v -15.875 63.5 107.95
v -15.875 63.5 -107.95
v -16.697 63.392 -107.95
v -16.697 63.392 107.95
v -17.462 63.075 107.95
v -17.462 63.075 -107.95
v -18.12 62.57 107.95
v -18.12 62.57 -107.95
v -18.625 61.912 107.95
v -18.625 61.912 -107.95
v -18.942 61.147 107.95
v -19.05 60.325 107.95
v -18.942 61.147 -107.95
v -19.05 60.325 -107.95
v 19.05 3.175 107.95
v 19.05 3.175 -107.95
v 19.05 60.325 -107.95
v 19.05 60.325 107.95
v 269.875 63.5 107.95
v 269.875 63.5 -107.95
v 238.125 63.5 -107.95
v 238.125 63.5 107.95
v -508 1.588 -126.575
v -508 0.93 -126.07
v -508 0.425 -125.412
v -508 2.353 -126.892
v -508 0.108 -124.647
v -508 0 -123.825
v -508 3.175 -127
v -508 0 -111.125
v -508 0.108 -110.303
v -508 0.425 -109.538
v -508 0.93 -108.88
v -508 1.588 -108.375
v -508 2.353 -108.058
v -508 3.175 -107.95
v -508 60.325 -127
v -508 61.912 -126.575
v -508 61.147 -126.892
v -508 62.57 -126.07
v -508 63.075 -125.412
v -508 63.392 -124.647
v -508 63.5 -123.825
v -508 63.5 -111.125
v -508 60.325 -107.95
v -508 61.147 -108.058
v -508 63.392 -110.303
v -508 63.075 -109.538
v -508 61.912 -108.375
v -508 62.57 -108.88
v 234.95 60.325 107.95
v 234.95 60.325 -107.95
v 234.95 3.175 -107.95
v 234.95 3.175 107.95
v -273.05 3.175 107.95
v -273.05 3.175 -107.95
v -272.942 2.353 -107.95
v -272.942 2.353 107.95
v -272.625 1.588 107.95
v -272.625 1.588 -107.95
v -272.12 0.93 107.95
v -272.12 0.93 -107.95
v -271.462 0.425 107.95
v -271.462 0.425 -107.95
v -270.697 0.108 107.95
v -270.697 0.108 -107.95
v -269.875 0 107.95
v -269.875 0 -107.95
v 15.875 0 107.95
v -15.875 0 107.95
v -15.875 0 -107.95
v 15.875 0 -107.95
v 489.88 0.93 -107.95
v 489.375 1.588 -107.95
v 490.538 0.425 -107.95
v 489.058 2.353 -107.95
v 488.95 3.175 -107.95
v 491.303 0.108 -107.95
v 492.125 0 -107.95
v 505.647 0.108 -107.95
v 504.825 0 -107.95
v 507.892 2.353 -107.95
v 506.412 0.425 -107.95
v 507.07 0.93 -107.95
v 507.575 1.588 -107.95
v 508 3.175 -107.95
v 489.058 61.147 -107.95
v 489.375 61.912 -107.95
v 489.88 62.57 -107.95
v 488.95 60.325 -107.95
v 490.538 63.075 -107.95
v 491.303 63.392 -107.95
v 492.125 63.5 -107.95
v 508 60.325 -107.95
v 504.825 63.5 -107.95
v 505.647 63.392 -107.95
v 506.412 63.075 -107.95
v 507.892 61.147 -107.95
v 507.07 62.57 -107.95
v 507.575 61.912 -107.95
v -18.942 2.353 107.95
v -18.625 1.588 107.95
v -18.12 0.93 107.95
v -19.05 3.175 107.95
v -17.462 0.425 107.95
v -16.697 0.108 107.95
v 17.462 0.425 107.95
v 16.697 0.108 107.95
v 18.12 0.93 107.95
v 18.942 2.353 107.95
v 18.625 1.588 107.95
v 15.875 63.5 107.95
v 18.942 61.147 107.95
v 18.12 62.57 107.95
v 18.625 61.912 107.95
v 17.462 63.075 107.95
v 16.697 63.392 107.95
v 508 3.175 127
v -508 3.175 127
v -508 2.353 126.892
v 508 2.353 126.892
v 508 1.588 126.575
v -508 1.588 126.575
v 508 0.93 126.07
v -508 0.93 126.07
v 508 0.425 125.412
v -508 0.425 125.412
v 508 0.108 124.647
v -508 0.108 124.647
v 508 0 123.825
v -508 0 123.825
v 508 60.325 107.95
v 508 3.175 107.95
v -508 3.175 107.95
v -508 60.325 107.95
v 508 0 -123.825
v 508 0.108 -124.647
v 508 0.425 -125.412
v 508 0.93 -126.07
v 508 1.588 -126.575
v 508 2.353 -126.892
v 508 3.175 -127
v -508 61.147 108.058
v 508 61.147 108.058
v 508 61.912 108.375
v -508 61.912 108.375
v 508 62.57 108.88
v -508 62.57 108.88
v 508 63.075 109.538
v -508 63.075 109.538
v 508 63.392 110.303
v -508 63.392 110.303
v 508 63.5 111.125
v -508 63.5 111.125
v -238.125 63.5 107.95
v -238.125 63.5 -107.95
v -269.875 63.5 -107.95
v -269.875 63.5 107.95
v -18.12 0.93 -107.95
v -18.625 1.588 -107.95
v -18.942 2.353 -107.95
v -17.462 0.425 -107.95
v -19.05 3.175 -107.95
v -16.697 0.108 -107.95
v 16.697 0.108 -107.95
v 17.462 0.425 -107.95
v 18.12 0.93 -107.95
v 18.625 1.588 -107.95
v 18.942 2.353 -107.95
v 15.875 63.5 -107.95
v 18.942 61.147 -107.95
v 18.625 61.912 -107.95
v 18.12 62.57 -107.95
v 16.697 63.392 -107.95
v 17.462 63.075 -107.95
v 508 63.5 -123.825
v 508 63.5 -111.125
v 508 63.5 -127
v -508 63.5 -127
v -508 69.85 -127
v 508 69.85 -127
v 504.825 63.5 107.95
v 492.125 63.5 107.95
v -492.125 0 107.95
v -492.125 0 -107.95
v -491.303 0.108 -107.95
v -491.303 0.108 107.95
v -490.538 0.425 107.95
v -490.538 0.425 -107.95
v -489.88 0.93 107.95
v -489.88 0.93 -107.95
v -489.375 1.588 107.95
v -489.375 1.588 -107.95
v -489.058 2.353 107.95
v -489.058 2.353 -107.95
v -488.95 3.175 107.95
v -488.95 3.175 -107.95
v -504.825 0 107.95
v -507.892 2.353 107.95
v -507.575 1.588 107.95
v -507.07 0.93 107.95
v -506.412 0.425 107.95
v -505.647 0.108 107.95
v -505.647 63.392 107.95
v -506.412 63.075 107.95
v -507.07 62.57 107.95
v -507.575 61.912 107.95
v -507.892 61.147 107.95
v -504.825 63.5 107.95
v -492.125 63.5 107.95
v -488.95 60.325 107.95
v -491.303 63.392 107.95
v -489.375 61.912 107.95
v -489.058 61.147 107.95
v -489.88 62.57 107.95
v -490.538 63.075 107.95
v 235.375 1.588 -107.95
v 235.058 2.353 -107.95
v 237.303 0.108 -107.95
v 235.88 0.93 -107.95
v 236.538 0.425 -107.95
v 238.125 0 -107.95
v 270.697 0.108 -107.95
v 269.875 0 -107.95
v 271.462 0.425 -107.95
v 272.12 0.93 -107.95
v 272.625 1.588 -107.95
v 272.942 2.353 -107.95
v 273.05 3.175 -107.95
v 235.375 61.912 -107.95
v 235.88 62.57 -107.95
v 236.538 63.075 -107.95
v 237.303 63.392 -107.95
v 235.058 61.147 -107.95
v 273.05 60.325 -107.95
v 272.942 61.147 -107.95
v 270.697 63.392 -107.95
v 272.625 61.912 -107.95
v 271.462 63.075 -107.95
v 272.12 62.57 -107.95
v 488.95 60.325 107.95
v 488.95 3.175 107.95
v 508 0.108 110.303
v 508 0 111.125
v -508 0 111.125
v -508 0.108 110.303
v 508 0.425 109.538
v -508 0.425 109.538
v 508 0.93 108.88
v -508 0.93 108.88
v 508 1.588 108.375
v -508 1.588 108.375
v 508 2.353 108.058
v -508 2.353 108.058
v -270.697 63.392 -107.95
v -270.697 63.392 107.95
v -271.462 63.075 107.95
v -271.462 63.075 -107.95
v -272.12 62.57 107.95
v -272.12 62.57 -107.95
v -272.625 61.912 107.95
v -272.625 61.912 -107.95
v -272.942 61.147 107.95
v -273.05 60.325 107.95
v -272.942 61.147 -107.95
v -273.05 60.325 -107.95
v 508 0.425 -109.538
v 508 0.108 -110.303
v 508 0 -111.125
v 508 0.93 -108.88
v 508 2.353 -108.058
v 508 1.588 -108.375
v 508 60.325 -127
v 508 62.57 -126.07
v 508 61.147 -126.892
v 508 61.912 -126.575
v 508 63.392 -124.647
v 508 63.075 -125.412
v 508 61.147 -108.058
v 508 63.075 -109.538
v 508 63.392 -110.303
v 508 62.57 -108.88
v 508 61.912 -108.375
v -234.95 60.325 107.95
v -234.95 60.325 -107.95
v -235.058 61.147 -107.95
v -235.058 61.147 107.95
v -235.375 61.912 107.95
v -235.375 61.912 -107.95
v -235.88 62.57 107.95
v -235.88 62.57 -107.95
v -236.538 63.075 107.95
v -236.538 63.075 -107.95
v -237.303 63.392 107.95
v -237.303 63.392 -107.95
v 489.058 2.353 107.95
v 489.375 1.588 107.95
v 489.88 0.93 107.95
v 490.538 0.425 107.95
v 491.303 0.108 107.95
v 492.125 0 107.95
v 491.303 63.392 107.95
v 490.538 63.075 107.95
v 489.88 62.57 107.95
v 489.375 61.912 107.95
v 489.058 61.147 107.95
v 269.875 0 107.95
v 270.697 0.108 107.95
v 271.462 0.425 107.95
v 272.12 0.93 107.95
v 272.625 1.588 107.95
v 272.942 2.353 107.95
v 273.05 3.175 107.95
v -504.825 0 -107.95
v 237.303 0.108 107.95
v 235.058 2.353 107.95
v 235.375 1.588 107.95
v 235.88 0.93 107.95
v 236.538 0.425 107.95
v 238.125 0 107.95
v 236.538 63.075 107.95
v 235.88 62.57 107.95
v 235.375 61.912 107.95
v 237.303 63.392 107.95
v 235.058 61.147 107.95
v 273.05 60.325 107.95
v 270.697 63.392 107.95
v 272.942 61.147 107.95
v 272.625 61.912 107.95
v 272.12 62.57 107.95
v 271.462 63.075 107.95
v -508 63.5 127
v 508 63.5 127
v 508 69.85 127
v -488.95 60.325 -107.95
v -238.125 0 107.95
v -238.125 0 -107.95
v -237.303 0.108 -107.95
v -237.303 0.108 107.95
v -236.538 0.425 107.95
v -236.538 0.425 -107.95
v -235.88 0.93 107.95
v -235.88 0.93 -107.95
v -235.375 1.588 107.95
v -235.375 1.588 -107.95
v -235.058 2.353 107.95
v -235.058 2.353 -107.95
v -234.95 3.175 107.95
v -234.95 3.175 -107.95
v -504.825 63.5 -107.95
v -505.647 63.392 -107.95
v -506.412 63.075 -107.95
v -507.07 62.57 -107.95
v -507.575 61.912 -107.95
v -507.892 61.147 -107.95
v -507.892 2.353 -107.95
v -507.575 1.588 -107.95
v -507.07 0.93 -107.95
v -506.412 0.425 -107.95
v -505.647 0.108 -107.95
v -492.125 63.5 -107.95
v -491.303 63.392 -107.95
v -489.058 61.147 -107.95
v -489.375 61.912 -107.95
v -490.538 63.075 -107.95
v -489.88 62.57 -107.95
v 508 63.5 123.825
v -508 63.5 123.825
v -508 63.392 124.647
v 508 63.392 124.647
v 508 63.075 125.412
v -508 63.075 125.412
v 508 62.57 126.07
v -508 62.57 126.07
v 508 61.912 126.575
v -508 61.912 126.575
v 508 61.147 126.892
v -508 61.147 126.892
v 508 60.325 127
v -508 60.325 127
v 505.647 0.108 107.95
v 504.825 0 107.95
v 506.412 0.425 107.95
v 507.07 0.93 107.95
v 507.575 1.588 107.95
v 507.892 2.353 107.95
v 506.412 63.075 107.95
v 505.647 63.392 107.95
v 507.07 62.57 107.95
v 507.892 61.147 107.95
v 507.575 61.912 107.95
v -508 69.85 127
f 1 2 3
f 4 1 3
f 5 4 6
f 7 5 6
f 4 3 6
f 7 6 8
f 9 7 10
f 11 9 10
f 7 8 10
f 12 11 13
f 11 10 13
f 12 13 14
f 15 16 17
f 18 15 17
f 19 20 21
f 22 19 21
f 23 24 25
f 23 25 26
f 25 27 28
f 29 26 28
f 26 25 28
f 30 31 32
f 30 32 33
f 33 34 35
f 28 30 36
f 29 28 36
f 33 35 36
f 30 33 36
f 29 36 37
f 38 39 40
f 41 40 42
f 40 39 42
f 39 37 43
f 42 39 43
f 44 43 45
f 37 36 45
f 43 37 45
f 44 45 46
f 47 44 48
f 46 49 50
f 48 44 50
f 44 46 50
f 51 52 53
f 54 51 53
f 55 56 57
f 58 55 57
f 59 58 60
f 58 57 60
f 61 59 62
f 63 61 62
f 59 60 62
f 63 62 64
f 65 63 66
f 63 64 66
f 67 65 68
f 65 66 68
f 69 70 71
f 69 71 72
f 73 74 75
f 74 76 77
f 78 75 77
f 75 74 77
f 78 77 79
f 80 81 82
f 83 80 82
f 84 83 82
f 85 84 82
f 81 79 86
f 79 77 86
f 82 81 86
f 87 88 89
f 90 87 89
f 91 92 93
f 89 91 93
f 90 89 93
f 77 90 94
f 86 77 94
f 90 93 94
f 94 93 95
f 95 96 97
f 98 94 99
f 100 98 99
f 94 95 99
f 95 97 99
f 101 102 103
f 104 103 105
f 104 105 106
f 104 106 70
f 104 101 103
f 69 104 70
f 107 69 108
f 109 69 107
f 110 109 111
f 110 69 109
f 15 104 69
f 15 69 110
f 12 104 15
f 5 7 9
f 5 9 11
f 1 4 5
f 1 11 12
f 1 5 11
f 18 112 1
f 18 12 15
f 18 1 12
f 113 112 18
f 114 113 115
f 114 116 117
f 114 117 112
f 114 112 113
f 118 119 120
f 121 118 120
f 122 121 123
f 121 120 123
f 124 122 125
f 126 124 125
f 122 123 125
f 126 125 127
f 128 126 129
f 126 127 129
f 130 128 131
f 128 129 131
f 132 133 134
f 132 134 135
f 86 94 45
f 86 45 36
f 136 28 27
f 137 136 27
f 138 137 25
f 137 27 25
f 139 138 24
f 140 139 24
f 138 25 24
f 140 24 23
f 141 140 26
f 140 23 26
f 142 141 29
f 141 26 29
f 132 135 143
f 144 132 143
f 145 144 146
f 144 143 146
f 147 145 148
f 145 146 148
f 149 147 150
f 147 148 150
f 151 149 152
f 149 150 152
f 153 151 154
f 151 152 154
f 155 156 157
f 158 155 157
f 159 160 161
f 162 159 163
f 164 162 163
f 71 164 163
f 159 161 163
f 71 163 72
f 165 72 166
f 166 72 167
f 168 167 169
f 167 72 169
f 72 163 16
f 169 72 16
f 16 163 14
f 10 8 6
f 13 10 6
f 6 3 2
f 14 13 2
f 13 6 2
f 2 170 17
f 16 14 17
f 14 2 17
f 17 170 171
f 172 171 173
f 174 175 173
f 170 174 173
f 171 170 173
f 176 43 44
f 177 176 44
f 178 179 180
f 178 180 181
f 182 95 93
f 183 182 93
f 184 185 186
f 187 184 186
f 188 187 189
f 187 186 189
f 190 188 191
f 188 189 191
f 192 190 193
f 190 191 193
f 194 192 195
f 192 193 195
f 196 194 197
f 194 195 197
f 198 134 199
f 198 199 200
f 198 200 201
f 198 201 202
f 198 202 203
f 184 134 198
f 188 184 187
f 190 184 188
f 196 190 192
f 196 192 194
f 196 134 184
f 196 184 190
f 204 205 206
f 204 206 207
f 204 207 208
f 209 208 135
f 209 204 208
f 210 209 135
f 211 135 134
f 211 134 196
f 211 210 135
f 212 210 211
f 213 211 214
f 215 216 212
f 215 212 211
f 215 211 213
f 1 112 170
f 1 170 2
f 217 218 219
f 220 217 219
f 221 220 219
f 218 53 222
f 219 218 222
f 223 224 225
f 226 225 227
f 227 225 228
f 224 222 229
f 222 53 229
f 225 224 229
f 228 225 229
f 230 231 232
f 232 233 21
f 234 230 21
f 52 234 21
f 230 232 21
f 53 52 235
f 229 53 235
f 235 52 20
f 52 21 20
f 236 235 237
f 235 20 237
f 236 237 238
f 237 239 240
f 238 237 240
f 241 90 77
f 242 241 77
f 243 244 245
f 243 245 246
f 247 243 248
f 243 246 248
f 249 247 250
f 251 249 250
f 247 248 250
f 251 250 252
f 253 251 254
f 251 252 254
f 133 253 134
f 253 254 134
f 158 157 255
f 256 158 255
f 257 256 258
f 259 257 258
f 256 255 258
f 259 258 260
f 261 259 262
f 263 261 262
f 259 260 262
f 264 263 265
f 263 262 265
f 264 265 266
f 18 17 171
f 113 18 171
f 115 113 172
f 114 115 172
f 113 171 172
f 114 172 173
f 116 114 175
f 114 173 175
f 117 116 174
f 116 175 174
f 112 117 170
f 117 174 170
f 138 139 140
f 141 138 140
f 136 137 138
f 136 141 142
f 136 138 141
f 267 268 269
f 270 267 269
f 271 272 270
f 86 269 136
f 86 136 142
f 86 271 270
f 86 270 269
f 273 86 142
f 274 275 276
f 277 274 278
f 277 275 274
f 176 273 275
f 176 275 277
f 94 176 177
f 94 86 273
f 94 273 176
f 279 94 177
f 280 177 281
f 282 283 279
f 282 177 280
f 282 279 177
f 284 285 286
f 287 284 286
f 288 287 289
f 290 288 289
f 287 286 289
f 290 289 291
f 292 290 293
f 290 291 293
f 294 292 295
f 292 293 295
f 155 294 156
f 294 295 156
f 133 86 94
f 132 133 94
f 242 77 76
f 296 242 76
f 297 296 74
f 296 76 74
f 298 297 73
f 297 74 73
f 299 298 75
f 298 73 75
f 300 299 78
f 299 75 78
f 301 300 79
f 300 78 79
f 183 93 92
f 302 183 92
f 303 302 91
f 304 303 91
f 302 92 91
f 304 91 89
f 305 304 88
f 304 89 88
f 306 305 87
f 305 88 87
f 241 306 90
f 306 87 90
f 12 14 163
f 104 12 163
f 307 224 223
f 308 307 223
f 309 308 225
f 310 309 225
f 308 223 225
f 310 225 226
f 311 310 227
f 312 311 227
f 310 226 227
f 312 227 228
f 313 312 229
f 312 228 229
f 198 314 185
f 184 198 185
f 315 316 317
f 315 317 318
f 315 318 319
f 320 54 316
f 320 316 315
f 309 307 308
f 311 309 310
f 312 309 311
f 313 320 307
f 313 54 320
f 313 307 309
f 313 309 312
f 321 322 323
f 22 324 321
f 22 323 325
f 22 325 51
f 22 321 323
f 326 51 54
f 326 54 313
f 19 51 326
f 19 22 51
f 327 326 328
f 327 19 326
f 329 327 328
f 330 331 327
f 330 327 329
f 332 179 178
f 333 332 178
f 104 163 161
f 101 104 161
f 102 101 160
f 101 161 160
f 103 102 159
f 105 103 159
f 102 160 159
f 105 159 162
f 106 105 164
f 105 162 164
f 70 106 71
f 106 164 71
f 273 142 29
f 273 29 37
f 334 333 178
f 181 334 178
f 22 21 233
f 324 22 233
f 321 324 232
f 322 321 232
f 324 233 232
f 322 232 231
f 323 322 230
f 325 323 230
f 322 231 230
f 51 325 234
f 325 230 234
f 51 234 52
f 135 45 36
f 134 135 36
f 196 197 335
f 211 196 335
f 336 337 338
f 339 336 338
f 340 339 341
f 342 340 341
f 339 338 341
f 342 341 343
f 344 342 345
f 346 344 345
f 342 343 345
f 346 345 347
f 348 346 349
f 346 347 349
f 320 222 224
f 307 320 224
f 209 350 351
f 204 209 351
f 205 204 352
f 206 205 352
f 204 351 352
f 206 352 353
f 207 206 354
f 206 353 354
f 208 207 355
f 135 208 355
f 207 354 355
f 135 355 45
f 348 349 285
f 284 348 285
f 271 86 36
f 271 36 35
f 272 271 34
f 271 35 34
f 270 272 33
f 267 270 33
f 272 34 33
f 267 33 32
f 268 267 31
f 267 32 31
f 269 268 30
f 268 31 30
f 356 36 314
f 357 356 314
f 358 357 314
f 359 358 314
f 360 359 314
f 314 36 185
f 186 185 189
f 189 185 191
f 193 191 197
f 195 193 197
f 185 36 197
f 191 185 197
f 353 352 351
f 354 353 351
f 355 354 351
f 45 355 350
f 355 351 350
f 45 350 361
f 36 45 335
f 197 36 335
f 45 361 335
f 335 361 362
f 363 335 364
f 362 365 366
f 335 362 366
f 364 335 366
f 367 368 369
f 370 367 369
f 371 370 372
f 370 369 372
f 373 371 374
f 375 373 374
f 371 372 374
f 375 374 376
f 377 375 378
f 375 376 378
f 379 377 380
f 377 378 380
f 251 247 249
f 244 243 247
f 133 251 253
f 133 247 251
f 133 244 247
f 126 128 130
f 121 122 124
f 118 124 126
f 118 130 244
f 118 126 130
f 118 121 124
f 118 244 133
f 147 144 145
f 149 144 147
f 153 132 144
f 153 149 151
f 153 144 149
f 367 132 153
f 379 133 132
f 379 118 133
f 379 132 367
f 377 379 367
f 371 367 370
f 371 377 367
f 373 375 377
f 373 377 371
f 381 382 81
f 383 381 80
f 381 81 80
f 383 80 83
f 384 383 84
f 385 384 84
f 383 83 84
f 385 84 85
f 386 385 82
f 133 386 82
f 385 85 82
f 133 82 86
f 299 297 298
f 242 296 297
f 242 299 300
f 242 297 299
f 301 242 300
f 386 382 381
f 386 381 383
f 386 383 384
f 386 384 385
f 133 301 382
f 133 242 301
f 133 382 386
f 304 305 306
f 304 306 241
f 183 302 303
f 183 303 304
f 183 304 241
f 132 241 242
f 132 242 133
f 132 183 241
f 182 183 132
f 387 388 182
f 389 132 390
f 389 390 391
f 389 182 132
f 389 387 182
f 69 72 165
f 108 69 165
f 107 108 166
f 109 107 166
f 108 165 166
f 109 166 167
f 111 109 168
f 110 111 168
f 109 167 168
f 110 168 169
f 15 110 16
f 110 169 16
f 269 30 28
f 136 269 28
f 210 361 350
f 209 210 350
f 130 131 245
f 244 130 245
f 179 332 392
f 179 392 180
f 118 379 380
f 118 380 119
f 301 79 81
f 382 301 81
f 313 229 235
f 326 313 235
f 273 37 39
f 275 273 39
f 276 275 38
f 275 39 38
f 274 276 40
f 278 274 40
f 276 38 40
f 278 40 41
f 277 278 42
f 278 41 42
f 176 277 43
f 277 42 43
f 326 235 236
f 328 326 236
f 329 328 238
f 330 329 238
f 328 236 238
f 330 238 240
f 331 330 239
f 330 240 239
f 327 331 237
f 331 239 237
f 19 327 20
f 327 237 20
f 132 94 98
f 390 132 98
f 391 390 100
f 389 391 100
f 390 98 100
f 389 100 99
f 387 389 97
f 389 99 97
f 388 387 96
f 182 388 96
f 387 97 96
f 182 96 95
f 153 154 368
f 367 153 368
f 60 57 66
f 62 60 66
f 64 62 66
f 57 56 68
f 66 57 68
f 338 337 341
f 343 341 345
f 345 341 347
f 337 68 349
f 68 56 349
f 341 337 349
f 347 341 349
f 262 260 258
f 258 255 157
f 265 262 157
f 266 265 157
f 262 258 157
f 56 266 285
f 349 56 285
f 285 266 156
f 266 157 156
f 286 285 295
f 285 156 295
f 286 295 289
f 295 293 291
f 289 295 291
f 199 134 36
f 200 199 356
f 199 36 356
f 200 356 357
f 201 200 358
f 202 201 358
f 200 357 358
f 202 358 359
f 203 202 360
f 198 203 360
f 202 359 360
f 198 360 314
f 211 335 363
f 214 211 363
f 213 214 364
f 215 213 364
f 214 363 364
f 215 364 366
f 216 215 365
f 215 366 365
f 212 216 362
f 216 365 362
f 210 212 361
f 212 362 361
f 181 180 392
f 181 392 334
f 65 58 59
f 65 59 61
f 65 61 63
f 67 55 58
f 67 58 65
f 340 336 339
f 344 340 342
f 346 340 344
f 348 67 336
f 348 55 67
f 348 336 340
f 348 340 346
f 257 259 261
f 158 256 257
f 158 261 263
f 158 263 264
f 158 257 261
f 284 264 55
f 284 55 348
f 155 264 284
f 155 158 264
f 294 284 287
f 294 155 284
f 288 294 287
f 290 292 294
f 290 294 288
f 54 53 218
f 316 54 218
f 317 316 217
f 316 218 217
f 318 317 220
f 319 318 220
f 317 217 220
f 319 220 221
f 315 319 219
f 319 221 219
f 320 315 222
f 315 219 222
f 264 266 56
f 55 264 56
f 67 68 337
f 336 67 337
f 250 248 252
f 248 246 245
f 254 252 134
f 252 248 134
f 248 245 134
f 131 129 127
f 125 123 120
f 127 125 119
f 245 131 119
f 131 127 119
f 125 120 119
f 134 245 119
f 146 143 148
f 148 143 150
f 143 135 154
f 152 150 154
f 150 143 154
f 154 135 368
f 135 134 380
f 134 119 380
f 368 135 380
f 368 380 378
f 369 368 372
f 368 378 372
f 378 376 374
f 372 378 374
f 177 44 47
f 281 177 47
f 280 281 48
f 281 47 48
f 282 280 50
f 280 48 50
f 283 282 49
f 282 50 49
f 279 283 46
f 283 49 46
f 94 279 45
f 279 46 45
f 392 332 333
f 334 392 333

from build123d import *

# Parameters (mm, degrees)
PROFILE_START           = -508
PROFILE_1_X_3_1_DEPTH   = 1016
PROFILE_START_2         = -107.95
PROFILE_1_X_3_1_2_DEPTH = 215.9
PROFILE_2_X_4_9_DEPTH   = 215.9
PROFILE_2_X_4_9_2_DEPTH = 215.9
PROFILE_2_X_4_9_3_DEPTH = 215.9
SKETCH117_W             = 254
SKETCH117_H             = 254
SKETCH117_W_2           = 254.10095092
SKETCH117_W_3           = 253.89904908
SKETCH117_W_4           = 12.7
SKETCH117_H_2           = 215.9
BOSS_EXTRUDE2_DEPTH     = 6.35


# Read off the part's stored shape, not the designer's step: Profile 1 X 3(1)
with BuildPart() as part:
    # Profile 1 X 3(1) outline → Profile 1 X 3(1) (new body)
    with BuildSketch(Plane.YZ.offset(PROFILE_START)):
        with BuildLine():
            Line((3.175, -127), (60.325, -127))
            ThreePointArc((60.325, -127), (62.57006403, -126.07006403), (63.5, -123.825))
            Line((63.5, -123.825), (63.5, -111.125))
            ThreePointArc((63.5, -111.125), (62.57006403, -108.87993597), (60.325, -107.95))
            Line((60.325, -107.95), (3.175, -107.95))
            ThreePointArc((3.175, -107.95), (0.92993597, -108.87993597), (0, -111.125))
            Line((0, -111.125), (0, -123.825))
            ThreePointArc((0, -123.825), (0.92993597, -126.07006403), (3.175, -127))
        make_face()
        with BuildLine():
            Line((3.175, 107.95), (60.325, 107.95))
            ThreePointArc((60.325, 107.95), (62.57006403, 108.87993597), (63.5, 111.125))
            Line((63.5, 111.125), (63.5, 123.825))
            ThreePointArc((63.5, 123.825), (62.57006403, 126.07006403), (60.325, 127))
            Line((60.325, 127), (3.175, 127))
            ThreePointArc((3.175, 127), (0.92993597, 126.07006403), (0, 123.825))
            Line((0, 123.825), (0, 111.125))
            ThreePointArc((0, 111.125), (0.92993597, 108.87993597), (3.175, 107.95))
        make_face()
    extrude(amount=PROFILE_1_X_3_1_DEPTH)


with BuildPart() as body_2:
    # Profile 1 X 3_1 2 outline → Profile 1 X 3_1 2 (new body)
    with BuildSketch(Plane.XY.offset(PROFILE_START_2)):
        with BuildLine():
            Line((504.825, 63.5), (492.125, 63.5))
            ThreePointArc((492.125, 63.5), (489.87993597, 62.57006403), (488.95, 60.325))
            Line((488.95, 60.325), (488.95, 3.175))
            ThreePointArc((488.95, 3.175), (489.87993597, 0.92993597), (492.125, 0))
            Line((492.125, 0), (504.825, 0))
            ThreePointArc((504.825, 0), (507.07006403, 0.92993597), (508, 3.175))
            Line((508, 3.175), (508, 60.325))
            ThreePointArc((508, 60.325), (507.07006403, 62.57006403), (504.825, 63.5))
        make_face()
        with BuildLine():
            Line((-492.125, 63.5), (-504.825, 63.5))
            ThreePointArc((-504.825, 63.5), (-507.07006403, 62.57006403), (-508, 60.325))
            Line((-508, 60.325), (-508, 3.175))
            ThreePointArc((-508, 3.175), (-507.07006403, 0.92993597), (-504.825, 0))
            Line((-504.825, 0), (-492.125, 0))
            ThreePointArc((-492.125, 0), (-489.87993597, 0.92993597), (-488.95, 3.175))
            Line((-488.95, 3.175), (-488.95, 60.325))
            ThreePointArc((-488.95, 60.325), (-489.87993597, 62.57006403), (-492.125, 63.5))
        make_face()
    extrude(amount=PROFILE_1_X_3_1_2_DEPTH)


with BuildPart() as body_3:
    # Sketch116 → Profile 2 X 4(9) (new body)
    with BuildSketch(Plane(origin=(-273.05, 0, -107.95), x_dir=(1, 0, 0), z_dir=(0, 0, 1))):
        with BuildLine():
            Line((3.175, 0), (34.925, 0))
            ThreePointArc((34.925, 0), (37.17006403, 0.92993597), (38.1, 3.175))
            Line((38.1, 3.175), (38.1, 60.325))
            ThreePointArc((38.1, 60.325), (37.17006403, 62.57006403), (34.925, 63.5))
            Line((34.925, 63.5), (3.175, 63.5))
            ThreePointArc((3.175, 63.5), (0.92993597, 62.57006403), (0, 60.325))
            Line((0, 60.325), (0, 3.175))
            ThreePointArc((0, 3.175), (0.92993597, 0.92993597), (3.175, 0))
        make_face()
    extrude(amount=PROFILE_2_X_4_9_DEPTH)


with BuildPart() as body_4:
    # Sketch116 on segment 2 (carried to segment 2) → Profile 2 X 4_9 2 (new body)
    with BuildSketch(Plane(origin=(-19.05, 0, -107.95), x_dir=(1, 0, 0), z_dir=(0, 0, 1))):
        with BuildLine():
            Line((3.175, 0), (34.925, 0))
            ThreePointArc((34.925, 0), (37.17006403, 0.92993597), (38.1, 3.175))
            Line((38.1, 3.175), (38.1, 60.325))
            ThreePointArc((38.1, 60.325), (37.17006403, 62.57006403), (34.925, 63.5))
            Line((34.925, 63.5), (3.175, 63.5))
            ThreePointArc((3.175, 63.5), (0.92993597, 62.57006403), (0, 60.325))
            Line((0, 60.325), (0, 3.175))
            ThreePointArc((0, 3.175), (0.92993597, 0.92993597), (3.175, 0))
        make_face()
    extrude(amount=PROFILE_2_X_4_9_2_DEPTH)


with BuildPart() as body_5:
    # Sketch116 on segment 3 (carried to segment 3) → Profile 2 X 4_9 3 (new body)
    with BuildSketch(Plane(origin=(234.95, 0, -107.95), x_dir=(1, 0, 0), z_dir=(0, 0, 1))):
        with BuildLine():
            Line((3.175, 0), (34.925, 0))
            ThreePointArc((34.925, 0), (37.17006403, 0.92993597), (38.1, 3.175))
            Line((38.1, 3.175), (38.1, 60.325))
            ThreePointArc((38.1, 60.325), (37.17006403, 62.57006403), (34.925, 63.5))
            Line((34.925, 63.5), (3.175, 63.5))
            ThreePointArc((3.175, 63.5), (0.92993597, 62.57006403), (0, 60.325))
            Line((0, 60.325), (0, 3.175))
            ThreePointArc((0, 3.175), (0.92993597, 0.92993597), (3.175, 0))
        make_face()
    extrude(amount=PROFILE_2_X_4_9_3_DEPTH)


with BuildPart() as body_6:
    # Sketch117 → Boss-Extrude2 (new body)
    # profile 1 of 5: a face of its own
    with BuildSketch(Plane(origin=(0, 63.5, 0), x_dir=(1, 0, 0), z_dir=(0, 1, 0))):
        with Locations((-127.10095092, 0)):
            Rectangle(SKETCH117_W, SKETCH117_H)
    # profile 2 of 5: a face of its own
    with BuildSketch(Plane(origin=(0, 63.5, 0), x_dir=(1, 0, 0), z_dir=(0, 1, 0))):
        with Locations((126.89904908, 0)):
            Rectangle(SKETCH117_W, SKETCH117_H)
    # profile 3 of 5: a face of its own
    with BuildSketch(Plane(origin=(0, 63.5, 0), x_dir=(1, 0, 0), z_dir=(0, 1, 0))):
        with Locations((380.94952454, 0)):
            Rectangle(SKETCH117_W_2, SKETCH117_H)
    # profile 4 of 5: a face of its own
    with BuildSketch(Plane(origin=(0, 63.5, 0), x_dir=(1, 0, 0), z_dir=(0, 1, 0))):
        with Locations((-381.05047546, 0)):
            Rectangle(SKETCH117_W_3, SKETCH117_H)
        with Locations((-498.475, 0)):
            Rectangle(SKETCH117_W_4, SKETCH117_H_2, mode=Mode.SUBTRACT)
    # profile 5 of 5: a face of its own
    with BuildSketch(Plane(origin=(0, 63.5, 0), x_dir=(1, 0, 0), z_dir=(0, 1, 0))):
        with Locations((-498.475, 0)):
            Rectangle(SKETCH117_W_4, SKETCH117_H_2)
    extrude(amount=BOSS_EXTRUDE2_DEPTH)


solid = Compound([part.part, body_2.part, body_3.part, body_4.part, body_5.part, body_6.part])
